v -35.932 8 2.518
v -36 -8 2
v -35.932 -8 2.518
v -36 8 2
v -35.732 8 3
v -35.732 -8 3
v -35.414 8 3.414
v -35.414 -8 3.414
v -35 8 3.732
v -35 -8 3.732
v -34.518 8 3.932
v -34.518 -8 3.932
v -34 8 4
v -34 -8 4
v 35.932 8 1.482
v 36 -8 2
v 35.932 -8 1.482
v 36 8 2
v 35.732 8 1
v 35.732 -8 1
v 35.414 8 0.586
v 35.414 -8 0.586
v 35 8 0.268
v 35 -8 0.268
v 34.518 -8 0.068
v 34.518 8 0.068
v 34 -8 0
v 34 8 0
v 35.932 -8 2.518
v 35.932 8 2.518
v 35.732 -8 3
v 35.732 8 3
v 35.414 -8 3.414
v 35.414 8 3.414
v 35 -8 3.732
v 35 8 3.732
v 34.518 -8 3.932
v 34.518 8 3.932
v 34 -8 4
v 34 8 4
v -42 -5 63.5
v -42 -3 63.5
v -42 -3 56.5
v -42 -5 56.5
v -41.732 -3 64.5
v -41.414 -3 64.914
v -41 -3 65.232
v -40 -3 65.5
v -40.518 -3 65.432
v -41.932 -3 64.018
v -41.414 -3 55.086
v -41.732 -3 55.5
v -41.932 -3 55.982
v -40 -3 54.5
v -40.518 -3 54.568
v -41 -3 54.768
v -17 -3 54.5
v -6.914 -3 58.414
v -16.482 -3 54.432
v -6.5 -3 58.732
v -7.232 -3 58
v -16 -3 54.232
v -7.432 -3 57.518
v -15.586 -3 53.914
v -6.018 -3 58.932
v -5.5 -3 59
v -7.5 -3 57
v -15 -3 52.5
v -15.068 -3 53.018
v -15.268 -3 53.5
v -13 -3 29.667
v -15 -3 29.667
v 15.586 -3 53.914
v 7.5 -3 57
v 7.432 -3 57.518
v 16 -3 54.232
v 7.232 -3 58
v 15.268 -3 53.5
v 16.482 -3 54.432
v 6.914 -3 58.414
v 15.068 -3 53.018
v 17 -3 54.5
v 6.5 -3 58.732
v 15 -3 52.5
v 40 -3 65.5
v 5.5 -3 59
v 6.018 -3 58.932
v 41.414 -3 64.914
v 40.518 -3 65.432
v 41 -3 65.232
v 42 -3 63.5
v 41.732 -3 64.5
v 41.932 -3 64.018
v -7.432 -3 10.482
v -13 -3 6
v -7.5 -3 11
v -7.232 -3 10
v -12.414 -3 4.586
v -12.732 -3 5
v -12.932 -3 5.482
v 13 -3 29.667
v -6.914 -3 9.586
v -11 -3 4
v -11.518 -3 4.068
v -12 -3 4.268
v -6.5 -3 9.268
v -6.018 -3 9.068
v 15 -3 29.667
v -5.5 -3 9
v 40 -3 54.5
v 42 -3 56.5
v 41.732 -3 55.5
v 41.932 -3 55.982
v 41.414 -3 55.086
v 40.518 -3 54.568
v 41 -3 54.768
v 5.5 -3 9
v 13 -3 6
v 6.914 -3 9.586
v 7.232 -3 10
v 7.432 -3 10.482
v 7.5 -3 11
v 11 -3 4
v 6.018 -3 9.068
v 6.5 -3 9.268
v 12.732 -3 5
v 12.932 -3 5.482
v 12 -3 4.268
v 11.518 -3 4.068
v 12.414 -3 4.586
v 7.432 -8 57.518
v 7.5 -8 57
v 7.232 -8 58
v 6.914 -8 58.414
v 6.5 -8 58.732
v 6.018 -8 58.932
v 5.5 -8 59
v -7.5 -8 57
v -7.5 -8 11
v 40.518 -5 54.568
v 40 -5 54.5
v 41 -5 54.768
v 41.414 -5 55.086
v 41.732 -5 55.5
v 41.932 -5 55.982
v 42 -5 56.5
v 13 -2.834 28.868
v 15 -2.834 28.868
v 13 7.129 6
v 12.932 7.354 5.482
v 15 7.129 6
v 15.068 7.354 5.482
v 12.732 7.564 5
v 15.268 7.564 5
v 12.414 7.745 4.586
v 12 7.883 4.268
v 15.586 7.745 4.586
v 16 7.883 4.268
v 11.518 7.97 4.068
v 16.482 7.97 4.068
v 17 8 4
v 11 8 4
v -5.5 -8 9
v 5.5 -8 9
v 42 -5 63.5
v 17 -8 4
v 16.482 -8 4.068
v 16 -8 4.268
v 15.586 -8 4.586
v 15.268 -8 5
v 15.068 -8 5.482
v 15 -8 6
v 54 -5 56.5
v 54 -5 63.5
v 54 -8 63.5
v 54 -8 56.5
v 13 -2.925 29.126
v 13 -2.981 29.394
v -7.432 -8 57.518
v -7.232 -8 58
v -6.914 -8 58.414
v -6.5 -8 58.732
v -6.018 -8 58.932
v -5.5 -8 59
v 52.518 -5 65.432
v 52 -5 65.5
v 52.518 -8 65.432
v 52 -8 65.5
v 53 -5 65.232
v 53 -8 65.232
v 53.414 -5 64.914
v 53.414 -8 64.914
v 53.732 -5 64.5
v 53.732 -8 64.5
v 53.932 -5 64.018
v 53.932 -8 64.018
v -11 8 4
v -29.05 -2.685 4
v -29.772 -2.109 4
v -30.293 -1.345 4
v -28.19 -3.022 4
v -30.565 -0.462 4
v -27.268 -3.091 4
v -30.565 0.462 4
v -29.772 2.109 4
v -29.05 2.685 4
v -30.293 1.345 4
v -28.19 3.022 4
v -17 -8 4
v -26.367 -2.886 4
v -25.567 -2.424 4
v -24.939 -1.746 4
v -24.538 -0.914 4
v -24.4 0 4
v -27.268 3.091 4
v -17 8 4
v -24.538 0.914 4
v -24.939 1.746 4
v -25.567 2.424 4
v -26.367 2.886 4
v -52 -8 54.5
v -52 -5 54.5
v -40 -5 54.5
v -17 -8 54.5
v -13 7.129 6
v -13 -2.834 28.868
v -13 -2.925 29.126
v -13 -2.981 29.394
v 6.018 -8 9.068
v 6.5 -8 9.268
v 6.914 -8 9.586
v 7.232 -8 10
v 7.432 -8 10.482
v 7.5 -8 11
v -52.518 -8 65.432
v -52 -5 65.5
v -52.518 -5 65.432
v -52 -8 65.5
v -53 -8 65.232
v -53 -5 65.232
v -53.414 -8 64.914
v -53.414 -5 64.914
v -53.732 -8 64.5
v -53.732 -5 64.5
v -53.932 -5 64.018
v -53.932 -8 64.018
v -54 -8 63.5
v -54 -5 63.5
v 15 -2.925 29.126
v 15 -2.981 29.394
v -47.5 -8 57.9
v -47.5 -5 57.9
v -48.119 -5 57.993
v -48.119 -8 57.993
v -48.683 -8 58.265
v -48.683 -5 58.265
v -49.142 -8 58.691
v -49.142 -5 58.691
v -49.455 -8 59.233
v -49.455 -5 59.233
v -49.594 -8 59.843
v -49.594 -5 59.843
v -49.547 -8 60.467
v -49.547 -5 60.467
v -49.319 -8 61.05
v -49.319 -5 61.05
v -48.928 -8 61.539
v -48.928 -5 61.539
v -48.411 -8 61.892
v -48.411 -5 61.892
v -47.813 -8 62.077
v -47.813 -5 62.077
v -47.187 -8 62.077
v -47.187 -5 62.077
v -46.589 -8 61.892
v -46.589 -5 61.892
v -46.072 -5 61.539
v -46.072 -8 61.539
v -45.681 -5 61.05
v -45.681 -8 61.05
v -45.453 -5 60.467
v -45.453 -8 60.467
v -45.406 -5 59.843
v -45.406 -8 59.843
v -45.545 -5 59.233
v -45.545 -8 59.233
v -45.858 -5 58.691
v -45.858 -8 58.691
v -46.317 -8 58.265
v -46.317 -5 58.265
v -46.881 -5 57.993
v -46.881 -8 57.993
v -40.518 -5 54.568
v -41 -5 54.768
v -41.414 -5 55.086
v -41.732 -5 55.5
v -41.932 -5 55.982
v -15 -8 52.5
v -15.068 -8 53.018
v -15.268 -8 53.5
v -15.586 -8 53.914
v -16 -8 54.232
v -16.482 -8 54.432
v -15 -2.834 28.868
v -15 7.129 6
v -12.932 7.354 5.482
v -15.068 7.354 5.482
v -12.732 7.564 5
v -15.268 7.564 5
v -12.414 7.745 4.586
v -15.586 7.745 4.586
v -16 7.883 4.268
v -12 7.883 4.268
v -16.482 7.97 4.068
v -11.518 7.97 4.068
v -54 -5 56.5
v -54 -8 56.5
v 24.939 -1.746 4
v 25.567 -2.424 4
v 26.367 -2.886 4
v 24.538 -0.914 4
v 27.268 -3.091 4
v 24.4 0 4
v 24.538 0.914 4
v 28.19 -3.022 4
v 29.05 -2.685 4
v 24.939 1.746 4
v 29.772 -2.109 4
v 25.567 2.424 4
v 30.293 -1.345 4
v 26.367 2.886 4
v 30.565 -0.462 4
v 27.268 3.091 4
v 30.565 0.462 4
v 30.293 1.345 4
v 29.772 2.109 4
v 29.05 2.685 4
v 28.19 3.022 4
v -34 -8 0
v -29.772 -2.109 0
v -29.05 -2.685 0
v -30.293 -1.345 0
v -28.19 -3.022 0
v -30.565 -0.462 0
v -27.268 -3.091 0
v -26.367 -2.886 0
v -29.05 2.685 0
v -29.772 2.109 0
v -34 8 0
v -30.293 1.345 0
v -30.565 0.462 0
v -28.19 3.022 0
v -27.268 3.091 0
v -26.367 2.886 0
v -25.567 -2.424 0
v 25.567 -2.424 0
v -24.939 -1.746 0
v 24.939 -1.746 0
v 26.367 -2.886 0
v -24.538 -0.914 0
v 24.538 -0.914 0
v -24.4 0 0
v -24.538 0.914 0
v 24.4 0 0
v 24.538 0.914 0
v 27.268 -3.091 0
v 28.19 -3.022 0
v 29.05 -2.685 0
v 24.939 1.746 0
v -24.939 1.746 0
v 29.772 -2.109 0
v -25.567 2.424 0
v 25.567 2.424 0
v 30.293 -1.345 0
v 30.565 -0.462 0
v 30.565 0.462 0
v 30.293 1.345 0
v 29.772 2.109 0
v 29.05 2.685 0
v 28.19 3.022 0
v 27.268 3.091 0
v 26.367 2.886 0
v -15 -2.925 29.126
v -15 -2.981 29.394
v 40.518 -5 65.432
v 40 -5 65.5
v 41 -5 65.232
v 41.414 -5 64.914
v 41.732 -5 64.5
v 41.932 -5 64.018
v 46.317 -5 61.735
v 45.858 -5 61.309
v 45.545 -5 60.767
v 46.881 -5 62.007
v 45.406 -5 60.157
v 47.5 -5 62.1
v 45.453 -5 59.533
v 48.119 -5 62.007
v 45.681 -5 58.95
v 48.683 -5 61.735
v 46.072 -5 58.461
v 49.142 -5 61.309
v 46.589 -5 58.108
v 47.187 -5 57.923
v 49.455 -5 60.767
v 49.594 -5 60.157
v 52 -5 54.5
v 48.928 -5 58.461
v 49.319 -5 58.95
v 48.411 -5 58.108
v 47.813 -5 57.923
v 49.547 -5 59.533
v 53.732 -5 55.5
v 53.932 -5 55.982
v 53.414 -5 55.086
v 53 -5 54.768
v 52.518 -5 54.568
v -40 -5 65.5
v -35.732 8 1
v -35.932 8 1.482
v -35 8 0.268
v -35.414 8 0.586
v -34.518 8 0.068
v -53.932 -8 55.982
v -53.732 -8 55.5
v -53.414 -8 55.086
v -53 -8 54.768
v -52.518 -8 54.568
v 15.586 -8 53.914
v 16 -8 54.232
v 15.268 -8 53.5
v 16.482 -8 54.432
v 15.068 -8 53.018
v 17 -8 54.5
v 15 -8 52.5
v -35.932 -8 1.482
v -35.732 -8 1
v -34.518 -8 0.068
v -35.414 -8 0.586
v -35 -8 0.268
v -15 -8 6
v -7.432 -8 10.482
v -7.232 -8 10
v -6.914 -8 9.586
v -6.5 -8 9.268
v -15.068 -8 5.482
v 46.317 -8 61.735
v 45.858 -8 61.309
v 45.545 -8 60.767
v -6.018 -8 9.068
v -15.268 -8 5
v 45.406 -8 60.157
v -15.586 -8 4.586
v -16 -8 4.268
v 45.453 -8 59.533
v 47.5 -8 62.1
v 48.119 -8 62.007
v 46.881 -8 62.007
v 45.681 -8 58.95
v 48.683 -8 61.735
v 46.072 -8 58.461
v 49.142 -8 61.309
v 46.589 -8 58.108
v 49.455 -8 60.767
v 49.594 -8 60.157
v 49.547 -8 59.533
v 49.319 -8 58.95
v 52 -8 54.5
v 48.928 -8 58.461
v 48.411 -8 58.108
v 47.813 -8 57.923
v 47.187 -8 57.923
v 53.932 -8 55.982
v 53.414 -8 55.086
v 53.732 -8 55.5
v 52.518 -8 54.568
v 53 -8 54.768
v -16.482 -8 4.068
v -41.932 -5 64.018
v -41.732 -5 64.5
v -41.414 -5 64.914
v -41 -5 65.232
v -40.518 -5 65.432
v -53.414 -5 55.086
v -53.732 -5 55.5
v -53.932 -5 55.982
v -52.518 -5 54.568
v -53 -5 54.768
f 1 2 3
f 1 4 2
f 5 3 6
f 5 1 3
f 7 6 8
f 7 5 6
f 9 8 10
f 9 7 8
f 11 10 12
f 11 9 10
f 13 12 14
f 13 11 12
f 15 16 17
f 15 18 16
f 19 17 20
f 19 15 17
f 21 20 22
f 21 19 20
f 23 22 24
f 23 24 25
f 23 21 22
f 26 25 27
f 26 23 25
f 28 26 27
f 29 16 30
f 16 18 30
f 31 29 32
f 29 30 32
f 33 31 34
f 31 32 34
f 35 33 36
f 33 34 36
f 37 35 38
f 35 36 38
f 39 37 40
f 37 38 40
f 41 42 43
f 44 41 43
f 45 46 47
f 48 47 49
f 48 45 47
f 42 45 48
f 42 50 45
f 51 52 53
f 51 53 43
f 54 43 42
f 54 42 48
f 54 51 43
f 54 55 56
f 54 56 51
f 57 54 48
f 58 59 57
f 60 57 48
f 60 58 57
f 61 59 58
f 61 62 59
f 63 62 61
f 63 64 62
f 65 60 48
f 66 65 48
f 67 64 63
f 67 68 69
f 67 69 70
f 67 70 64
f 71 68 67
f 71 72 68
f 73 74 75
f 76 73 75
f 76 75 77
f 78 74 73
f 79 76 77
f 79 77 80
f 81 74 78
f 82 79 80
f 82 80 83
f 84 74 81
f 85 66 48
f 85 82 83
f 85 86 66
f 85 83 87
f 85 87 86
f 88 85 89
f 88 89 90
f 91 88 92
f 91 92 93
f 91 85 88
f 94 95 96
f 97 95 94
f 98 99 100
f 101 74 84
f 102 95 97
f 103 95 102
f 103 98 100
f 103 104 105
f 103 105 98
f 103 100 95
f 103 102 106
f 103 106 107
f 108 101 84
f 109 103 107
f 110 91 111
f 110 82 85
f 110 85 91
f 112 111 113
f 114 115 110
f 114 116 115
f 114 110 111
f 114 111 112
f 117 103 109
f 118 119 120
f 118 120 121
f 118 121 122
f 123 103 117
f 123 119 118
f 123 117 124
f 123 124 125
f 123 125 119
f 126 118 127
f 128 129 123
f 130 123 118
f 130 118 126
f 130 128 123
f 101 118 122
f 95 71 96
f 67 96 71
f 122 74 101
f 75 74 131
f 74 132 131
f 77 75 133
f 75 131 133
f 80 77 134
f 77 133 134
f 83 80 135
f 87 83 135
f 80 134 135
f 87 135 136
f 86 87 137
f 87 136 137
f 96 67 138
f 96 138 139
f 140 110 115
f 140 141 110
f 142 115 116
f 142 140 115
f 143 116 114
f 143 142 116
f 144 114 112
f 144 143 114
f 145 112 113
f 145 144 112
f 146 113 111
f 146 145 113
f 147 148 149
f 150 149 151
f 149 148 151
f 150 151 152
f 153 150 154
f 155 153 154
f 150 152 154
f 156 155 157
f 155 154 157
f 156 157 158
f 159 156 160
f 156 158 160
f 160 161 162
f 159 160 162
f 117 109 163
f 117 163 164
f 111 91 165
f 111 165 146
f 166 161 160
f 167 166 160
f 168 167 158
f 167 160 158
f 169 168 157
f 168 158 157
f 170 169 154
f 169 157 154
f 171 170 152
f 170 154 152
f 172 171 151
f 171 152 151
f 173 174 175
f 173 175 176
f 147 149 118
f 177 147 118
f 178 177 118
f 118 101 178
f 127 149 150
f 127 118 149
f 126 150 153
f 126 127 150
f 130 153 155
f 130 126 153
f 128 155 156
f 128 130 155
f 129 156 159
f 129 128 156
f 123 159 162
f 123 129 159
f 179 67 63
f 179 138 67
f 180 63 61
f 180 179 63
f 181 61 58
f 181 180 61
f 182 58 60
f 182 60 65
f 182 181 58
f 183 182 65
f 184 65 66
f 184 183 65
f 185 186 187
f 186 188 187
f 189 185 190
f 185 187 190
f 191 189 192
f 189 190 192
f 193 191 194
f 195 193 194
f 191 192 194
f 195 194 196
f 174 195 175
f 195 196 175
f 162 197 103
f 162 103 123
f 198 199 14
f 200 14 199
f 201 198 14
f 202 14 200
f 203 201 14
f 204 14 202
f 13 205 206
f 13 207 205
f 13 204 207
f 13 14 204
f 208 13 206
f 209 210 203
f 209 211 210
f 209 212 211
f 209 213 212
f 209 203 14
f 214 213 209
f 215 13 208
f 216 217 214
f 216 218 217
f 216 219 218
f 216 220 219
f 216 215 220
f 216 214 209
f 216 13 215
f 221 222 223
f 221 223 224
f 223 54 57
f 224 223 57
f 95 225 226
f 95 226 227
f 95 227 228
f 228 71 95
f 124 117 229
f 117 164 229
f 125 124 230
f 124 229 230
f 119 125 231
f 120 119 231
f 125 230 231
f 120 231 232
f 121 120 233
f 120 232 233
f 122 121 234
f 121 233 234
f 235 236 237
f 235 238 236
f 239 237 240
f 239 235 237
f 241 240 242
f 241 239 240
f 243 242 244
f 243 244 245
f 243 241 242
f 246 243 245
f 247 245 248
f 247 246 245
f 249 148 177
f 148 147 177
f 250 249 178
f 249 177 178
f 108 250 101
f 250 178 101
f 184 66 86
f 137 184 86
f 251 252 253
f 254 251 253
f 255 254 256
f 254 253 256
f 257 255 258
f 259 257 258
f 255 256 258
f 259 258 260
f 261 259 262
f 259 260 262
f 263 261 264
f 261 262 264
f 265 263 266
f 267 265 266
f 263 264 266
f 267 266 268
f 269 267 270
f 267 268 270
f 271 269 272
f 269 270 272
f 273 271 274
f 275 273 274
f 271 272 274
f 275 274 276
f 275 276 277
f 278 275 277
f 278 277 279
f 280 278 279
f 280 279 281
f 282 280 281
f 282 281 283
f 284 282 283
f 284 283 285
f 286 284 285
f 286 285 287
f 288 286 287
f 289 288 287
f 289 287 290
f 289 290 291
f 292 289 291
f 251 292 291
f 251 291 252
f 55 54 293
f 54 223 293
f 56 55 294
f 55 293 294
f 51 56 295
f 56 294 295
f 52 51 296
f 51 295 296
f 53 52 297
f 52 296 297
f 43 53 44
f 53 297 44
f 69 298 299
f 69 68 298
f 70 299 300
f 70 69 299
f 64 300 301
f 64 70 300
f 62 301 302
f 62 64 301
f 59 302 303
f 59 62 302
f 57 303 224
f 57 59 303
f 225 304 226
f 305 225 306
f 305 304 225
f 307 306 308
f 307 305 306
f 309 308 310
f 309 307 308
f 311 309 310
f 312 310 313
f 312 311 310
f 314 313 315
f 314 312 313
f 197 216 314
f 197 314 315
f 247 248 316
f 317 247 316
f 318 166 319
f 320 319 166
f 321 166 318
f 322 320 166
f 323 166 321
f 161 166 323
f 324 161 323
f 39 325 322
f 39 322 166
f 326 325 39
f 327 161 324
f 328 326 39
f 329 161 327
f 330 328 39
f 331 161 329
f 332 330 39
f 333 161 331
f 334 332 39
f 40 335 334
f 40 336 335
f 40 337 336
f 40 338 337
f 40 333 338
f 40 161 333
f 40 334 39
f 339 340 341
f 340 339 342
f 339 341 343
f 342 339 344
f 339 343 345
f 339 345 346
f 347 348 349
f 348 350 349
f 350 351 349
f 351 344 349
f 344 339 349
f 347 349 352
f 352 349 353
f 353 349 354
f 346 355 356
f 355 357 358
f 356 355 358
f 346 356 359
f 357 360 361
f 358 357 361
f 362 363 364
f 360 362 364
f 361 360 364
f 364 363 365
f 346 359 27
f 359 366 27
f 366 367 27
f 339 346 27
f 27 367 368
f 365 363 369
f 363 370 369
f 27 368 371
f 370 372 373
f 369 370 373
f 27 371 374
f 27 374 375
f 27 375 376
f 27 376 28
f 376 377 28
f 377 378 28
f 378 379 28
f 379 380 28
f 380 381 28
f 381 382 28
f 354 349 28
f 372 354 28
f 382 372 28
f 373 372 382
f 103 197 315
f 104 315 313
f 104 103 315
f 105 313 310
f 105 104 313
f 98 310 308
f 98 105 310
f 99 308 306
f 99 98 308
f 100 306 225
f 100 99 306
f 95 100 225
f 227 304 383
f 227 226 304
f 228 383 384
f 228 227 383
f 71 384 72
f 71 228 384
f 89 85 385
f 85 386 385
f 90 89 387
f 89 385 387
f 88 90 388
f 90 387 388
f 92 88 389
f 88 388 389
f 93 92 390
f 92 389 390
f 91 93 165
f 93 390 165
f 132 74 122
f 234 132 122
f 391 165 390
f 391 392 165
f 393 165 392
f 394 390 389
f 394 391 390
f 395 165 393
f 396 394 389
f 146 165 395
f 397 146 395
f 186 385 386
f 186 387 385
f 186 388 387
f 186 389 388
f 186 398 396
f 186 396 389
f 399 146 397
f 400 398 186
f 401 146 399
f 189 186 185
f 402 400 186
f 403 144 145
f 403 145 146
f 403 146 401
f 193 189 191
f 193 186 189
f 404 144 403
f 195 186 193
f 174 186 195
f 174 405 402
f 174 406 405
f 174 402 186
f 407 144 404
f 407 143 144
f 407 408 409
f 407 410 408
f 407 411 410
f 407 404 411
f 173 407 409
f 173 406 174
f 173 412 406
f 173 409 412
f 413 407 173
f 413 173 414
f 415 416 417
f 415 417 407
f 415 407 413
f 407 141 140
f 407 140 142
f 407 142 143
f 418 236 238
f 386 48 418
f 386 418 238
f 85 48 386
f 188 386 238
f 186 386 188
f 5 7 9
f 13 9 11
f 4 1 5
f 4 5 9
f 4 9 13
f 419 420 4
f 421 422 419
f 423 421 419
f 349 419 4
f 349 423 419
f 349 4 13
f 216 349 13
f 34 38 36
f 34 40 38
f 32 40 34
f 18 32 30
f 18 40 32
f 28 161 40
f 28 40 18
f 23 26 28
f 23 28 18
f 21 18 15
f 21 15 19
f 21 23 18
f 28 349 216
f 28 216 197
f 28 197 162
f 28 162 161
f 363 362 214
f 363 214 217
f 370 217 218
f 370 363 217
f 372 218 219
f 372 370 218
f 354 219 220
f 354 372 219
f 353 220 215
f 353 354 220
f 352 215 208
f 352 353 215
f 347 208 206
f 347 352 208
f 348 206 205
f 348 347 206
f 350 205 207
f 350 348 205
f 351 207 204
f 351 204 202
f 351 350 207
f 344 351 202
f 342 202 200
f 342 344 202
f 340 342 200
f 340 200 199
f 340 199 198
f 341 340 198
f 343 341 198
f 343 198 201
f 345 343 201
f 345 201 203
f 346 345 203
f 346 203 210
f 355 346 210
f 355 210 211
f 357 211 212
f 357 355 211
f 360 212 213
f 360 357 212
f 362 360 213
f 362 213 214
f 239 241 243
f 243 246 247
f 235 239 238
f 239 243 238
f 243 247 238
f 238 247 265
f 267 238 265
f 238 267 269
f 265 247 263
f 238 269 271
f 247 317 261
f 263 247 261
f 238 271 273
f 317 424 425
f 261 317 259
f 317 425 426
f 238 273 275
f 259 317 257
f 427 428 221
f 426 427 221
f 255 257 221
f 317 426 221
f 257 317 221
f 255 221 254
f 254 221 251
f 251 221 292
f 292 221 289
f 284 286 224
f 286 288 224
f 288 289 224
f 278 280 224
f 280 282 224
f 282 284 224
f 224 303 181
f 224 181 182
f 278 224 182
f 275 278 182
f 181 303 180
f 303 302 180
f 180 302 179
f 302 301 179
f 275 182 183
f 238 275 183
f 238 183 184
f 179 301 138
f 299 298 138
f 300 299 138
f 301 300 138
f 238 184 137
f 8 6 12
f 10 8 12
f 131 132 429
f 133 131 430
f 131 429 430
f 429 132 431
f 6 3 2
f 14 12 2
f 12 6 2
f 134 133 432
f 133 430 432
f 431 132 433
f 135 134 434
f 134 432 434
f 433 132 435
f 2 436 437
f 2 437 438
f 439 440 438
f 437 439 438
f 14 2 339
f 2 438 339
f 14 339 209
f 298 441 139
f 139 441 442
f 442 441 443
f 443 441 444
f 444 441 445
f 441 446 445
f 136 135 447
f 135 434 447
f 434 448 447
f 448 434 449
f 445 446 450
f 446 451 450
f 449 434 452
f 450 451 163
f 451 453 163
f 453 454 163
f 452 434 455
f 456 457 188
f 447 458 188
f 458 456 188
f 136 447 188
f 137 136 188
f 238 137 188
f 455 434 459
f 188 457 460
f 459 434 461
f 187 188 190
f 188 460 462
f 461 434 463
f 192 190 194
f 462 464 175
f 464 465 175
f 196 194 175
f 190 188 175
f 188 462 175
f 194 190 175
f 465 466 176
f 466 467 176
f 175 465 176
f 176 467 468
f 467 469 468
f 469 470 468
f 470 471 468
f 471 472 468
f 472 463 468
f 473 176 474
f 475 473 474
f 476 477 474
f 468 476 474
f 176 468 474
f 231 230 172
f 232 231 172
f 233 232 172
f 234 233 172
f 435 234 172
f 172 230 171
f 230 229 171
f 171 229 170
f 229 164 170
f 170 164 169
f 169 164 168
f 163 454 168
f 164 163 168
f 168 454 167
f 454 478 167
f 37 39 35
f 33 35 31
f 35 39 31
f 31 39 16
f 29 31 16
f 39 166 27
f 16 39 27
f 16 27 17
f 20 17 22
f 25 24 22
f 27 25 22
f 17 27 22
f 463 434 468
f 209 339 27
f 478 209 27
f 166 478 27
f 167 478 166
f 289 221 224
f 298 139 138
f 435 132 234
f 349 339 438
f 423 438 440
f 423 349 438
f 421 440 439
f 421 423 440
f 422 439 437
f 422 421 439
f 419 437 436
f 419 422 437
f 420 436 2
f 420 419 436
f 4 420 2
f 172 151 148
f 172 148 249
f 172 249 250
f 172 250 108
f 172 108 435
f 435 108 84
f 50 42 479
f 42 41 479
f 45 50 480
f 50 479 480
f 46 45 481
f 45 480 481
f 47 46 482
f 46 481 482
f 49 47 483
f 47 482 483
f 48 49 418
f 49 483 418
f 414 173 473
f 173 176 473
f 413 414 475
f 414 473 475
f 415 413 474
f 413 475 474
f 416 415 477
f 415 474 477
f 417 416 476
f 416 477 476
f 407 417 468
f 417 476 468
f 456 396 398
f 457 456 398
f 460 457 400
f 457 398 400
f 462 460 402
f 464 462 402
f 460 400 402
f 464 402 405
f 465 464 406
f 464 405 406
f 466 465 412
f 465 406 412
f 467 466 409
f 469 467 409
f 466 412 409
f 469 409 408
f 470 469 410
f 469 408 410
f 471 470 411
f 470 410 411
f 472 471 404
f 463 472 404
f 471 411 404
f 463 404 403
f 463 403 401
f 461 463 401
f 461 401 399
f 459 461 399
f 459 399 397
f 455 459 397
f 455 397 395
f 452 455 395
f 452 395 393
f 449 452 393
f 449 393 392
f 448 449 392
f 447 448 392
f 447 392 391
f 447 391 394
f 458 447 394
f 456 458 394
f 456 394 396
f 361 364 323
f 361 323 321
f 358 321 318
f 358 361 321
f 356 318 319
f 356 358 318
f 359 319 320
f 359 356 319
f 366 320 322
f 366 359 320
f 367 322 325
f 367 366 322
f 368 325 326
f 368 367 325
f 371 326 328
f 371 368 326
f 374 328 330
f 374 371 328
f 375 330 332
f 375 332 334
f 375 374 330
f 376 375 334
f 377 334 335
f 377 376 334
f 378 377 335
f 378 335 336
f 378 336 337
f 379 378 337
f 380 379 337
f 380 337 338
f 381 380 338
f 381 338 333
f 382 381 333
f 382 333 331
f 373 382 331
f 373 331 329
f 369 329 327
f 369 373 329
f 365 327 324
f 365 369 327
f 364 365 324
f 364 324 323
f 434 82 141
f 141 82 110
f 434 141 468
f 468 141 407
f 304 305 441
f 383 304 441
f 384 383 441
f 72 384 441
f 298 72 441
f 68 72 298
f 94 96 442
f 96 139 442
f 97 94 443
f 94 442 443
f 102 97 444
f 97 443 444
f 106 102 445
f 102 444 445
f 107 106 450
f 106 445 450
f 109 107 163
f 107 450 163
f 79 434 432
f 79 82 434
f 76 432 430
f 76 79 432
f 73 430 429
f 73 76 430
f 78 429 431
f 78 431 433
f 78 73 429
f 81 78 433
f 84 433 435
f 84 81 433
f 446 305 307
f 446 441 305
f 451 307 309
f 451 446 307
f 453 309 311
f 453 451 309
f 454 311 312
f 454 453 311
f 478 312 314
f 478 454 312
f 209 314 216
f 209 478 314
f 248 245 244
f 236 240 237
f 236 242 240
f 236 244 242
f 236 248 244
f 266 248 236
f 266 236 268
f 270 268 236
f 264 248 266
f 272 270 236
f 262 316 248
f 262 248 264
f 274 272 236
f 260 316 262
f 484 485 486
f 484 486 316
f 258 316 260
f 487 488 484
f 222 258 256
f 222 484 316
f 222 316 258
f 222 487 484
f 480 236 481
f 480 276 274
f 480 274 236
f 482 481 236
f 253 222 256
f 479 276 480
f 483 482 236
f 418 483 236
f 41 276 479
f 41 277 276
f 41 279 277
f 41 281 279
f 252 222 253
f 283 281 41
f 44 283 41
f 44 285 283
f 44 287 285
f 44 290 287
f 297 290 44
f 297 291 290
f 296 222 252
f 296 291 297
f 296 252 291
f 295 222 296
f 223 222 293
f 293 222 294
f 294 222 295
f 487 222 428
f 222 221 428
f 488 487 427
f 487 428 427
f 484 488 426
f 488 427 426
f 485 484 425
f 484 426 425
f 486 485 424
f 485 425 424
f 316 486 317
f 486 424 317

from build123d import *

# Parameters (mm, degrees)
SKETCH_1_W          = 72
SKETCH_1_H          = 16
SKETCH_1_R          = 3.1
EXTRUDE_1_DEPTH     = 4
EXTRUDE_START       = -4
SKETCH_3_W          = 30
SKETCH_3_H          = 5
EXTRUDE_2_DEPTH     = 60
SKETCH_5_W          = 108
SKETCH_5_H          = 11
SKETCH_5_R          = 2.1
EXTRUDE_3_DEPTH     = 5
SKETCH_6_W          = 12
SKETCH_6_H          = 11
CUT_EXTRUDE_1_DEPTH = 2
SKETCH_7_W          = 15
SKETCH_7_H          = 50
CUT_EXTRUDE_2_DEPTH = 86.599357474
EXTRUDE_4_DEPTH     = 2
EXTRUDE_START_2     = -30
EXTRUDE_5_DEPTH     = 2
FILLET_1_R          = 2


with BuildPart() as part:
    # 草图1 → 凸台-拉伸1 (new body)
    with BuildSketch(Plane.XY):
        Rectangle(SKETCH_1_W, SKETCH_1_H)
        with Locations((-27.5, 0)):
            Circle(SKETCH_1_R, mode=Mode.SUBTRACT)
        with Locations(Location((27.5, 0, 0), (0, 0, 180))):
            Circle(SKETCH_1_R, mode=Mode.SUBTRACT)
    extrude(amount=EXTRUDE_1_DEPTH)

    # 草图3 → 凸台-拉伸2 (add)
    with BuildSketch(Plane.XY.offset(4).offset(EXTRUDE_START)):
        with Locations((0, -5.5)):
            Rectangle(SKETCH_3_W, SKETCH_3_H)
    extrude(amount=EXTRUDE_2_DEPTH)

    # 草图5 → 凸台-拉伸3 (add, through all)
    with BuildSketch(Plane(origin=(0, -3, 0), x_dir=(1, 0, 0), z_dir=(0, 1, 0))):
        with Locations((0, -60)):
            Rectangle(SKETCH_5_W, SKETCH_5_H)
        with Locations(Location((47.5, -60, 0), (0, 0, 270))):
            Circle(SKETCH_5_R, mode=Mode.SUBTRACT)
        with Locations(Location((-47.5, -60, 0), (0, 0, 90))):
            Circle(SKETCH_5_R, mode=Mode.SUBTRACT)
    extrude(amount=-EXTRUDE_3_DEPTH)

    # 草图6 → 切除-拉伸1 (cut)
    with BuildSketch(Plane(origin=(0, -3, 0), x_dir=(1, 0, 0), z_dir=(0, 1, 0))):
        with Locations((-48, -60)):
            Rectangle(SKETCH_6_W, SKETCH_6_H)
        with Locations((48, -60)):
            Rectangle(SKETCH_6_W, SKETCH_6_H)
    extrude(amount=-CUT_EXTRUDE_1_DEPTH, mode=Mode.SUBTRACT)

    # 草图7 → 切除-拉伸2 (cut, through all)
    with BuildSketch(Plane(origin=(0, -3, 0), x_dir=(1, 0, 0), z_dir=(0, 1, 0))):
        with Locations((0, -34)):
            Rectangle(SKETCH_7_W, SKETCH_7_H)
    extrude(amount=-CUT_EXTRUDE_2_DEPTH, mode=Mode.SUBTRACT)

    # 草图8 → 凸台-拉伸4 (add)
    with BuildSketch(Plane.ZY.offset(15)):
        Polygon((4, -3), (29.25, -3), (4, 8), align=None)
    extrude(amount=-EXTRUDE_4_DEPTH)

    # 草图8<2> → 凸台-拉伸5 (add)
    with BuildSketch(Plane.ZY.offset(15).offset(EXTRUDE_START_2)):
        Polygon((4, -3), (29.25, -3), (4, 8), align=None)
    extrude(amount=EXTRUDE_5_DEPTH)

    # 圆角1
    fillet_1_edges = [part.edges().sort_by_distance(p)[0] for p in [
        (15, 0, 4),
        (36, 0, 4),
        (36, 0, 0),
        (-36, 0, 0),
        (-36, 0, 4),
        (-15, -5.5, 54.5),
        (-54, -6.5, 54.5),
        (-54, -6.5, 65.5),
        (54, -6.5, 65.5),
        (54, -6.5, 54.5),
        (15, -5.5, 54.5),
        (-15, 0, 4),
        (-42, -4, 54.5),
        (42, -4, 54.5),
        (42, -4, 65.5),
        (-42, -4, 65.5),
        (-7.5, -5.5, 59),
        (-7.5, -5.5, 9),
        (7.5, -5.5, 59),
        (7.5, -5.5, 9),
        (14, -3, 29.25),
        (-14, -3, 29.25),
        (-13, 2.5, 4),
        (13, 2.5, 4),
    ]]
    fillet(fillet_1_edges, radius=FILLET_1_R - 0.0001)  # a hair under: the kernel refuses the full size


solid = part.part
